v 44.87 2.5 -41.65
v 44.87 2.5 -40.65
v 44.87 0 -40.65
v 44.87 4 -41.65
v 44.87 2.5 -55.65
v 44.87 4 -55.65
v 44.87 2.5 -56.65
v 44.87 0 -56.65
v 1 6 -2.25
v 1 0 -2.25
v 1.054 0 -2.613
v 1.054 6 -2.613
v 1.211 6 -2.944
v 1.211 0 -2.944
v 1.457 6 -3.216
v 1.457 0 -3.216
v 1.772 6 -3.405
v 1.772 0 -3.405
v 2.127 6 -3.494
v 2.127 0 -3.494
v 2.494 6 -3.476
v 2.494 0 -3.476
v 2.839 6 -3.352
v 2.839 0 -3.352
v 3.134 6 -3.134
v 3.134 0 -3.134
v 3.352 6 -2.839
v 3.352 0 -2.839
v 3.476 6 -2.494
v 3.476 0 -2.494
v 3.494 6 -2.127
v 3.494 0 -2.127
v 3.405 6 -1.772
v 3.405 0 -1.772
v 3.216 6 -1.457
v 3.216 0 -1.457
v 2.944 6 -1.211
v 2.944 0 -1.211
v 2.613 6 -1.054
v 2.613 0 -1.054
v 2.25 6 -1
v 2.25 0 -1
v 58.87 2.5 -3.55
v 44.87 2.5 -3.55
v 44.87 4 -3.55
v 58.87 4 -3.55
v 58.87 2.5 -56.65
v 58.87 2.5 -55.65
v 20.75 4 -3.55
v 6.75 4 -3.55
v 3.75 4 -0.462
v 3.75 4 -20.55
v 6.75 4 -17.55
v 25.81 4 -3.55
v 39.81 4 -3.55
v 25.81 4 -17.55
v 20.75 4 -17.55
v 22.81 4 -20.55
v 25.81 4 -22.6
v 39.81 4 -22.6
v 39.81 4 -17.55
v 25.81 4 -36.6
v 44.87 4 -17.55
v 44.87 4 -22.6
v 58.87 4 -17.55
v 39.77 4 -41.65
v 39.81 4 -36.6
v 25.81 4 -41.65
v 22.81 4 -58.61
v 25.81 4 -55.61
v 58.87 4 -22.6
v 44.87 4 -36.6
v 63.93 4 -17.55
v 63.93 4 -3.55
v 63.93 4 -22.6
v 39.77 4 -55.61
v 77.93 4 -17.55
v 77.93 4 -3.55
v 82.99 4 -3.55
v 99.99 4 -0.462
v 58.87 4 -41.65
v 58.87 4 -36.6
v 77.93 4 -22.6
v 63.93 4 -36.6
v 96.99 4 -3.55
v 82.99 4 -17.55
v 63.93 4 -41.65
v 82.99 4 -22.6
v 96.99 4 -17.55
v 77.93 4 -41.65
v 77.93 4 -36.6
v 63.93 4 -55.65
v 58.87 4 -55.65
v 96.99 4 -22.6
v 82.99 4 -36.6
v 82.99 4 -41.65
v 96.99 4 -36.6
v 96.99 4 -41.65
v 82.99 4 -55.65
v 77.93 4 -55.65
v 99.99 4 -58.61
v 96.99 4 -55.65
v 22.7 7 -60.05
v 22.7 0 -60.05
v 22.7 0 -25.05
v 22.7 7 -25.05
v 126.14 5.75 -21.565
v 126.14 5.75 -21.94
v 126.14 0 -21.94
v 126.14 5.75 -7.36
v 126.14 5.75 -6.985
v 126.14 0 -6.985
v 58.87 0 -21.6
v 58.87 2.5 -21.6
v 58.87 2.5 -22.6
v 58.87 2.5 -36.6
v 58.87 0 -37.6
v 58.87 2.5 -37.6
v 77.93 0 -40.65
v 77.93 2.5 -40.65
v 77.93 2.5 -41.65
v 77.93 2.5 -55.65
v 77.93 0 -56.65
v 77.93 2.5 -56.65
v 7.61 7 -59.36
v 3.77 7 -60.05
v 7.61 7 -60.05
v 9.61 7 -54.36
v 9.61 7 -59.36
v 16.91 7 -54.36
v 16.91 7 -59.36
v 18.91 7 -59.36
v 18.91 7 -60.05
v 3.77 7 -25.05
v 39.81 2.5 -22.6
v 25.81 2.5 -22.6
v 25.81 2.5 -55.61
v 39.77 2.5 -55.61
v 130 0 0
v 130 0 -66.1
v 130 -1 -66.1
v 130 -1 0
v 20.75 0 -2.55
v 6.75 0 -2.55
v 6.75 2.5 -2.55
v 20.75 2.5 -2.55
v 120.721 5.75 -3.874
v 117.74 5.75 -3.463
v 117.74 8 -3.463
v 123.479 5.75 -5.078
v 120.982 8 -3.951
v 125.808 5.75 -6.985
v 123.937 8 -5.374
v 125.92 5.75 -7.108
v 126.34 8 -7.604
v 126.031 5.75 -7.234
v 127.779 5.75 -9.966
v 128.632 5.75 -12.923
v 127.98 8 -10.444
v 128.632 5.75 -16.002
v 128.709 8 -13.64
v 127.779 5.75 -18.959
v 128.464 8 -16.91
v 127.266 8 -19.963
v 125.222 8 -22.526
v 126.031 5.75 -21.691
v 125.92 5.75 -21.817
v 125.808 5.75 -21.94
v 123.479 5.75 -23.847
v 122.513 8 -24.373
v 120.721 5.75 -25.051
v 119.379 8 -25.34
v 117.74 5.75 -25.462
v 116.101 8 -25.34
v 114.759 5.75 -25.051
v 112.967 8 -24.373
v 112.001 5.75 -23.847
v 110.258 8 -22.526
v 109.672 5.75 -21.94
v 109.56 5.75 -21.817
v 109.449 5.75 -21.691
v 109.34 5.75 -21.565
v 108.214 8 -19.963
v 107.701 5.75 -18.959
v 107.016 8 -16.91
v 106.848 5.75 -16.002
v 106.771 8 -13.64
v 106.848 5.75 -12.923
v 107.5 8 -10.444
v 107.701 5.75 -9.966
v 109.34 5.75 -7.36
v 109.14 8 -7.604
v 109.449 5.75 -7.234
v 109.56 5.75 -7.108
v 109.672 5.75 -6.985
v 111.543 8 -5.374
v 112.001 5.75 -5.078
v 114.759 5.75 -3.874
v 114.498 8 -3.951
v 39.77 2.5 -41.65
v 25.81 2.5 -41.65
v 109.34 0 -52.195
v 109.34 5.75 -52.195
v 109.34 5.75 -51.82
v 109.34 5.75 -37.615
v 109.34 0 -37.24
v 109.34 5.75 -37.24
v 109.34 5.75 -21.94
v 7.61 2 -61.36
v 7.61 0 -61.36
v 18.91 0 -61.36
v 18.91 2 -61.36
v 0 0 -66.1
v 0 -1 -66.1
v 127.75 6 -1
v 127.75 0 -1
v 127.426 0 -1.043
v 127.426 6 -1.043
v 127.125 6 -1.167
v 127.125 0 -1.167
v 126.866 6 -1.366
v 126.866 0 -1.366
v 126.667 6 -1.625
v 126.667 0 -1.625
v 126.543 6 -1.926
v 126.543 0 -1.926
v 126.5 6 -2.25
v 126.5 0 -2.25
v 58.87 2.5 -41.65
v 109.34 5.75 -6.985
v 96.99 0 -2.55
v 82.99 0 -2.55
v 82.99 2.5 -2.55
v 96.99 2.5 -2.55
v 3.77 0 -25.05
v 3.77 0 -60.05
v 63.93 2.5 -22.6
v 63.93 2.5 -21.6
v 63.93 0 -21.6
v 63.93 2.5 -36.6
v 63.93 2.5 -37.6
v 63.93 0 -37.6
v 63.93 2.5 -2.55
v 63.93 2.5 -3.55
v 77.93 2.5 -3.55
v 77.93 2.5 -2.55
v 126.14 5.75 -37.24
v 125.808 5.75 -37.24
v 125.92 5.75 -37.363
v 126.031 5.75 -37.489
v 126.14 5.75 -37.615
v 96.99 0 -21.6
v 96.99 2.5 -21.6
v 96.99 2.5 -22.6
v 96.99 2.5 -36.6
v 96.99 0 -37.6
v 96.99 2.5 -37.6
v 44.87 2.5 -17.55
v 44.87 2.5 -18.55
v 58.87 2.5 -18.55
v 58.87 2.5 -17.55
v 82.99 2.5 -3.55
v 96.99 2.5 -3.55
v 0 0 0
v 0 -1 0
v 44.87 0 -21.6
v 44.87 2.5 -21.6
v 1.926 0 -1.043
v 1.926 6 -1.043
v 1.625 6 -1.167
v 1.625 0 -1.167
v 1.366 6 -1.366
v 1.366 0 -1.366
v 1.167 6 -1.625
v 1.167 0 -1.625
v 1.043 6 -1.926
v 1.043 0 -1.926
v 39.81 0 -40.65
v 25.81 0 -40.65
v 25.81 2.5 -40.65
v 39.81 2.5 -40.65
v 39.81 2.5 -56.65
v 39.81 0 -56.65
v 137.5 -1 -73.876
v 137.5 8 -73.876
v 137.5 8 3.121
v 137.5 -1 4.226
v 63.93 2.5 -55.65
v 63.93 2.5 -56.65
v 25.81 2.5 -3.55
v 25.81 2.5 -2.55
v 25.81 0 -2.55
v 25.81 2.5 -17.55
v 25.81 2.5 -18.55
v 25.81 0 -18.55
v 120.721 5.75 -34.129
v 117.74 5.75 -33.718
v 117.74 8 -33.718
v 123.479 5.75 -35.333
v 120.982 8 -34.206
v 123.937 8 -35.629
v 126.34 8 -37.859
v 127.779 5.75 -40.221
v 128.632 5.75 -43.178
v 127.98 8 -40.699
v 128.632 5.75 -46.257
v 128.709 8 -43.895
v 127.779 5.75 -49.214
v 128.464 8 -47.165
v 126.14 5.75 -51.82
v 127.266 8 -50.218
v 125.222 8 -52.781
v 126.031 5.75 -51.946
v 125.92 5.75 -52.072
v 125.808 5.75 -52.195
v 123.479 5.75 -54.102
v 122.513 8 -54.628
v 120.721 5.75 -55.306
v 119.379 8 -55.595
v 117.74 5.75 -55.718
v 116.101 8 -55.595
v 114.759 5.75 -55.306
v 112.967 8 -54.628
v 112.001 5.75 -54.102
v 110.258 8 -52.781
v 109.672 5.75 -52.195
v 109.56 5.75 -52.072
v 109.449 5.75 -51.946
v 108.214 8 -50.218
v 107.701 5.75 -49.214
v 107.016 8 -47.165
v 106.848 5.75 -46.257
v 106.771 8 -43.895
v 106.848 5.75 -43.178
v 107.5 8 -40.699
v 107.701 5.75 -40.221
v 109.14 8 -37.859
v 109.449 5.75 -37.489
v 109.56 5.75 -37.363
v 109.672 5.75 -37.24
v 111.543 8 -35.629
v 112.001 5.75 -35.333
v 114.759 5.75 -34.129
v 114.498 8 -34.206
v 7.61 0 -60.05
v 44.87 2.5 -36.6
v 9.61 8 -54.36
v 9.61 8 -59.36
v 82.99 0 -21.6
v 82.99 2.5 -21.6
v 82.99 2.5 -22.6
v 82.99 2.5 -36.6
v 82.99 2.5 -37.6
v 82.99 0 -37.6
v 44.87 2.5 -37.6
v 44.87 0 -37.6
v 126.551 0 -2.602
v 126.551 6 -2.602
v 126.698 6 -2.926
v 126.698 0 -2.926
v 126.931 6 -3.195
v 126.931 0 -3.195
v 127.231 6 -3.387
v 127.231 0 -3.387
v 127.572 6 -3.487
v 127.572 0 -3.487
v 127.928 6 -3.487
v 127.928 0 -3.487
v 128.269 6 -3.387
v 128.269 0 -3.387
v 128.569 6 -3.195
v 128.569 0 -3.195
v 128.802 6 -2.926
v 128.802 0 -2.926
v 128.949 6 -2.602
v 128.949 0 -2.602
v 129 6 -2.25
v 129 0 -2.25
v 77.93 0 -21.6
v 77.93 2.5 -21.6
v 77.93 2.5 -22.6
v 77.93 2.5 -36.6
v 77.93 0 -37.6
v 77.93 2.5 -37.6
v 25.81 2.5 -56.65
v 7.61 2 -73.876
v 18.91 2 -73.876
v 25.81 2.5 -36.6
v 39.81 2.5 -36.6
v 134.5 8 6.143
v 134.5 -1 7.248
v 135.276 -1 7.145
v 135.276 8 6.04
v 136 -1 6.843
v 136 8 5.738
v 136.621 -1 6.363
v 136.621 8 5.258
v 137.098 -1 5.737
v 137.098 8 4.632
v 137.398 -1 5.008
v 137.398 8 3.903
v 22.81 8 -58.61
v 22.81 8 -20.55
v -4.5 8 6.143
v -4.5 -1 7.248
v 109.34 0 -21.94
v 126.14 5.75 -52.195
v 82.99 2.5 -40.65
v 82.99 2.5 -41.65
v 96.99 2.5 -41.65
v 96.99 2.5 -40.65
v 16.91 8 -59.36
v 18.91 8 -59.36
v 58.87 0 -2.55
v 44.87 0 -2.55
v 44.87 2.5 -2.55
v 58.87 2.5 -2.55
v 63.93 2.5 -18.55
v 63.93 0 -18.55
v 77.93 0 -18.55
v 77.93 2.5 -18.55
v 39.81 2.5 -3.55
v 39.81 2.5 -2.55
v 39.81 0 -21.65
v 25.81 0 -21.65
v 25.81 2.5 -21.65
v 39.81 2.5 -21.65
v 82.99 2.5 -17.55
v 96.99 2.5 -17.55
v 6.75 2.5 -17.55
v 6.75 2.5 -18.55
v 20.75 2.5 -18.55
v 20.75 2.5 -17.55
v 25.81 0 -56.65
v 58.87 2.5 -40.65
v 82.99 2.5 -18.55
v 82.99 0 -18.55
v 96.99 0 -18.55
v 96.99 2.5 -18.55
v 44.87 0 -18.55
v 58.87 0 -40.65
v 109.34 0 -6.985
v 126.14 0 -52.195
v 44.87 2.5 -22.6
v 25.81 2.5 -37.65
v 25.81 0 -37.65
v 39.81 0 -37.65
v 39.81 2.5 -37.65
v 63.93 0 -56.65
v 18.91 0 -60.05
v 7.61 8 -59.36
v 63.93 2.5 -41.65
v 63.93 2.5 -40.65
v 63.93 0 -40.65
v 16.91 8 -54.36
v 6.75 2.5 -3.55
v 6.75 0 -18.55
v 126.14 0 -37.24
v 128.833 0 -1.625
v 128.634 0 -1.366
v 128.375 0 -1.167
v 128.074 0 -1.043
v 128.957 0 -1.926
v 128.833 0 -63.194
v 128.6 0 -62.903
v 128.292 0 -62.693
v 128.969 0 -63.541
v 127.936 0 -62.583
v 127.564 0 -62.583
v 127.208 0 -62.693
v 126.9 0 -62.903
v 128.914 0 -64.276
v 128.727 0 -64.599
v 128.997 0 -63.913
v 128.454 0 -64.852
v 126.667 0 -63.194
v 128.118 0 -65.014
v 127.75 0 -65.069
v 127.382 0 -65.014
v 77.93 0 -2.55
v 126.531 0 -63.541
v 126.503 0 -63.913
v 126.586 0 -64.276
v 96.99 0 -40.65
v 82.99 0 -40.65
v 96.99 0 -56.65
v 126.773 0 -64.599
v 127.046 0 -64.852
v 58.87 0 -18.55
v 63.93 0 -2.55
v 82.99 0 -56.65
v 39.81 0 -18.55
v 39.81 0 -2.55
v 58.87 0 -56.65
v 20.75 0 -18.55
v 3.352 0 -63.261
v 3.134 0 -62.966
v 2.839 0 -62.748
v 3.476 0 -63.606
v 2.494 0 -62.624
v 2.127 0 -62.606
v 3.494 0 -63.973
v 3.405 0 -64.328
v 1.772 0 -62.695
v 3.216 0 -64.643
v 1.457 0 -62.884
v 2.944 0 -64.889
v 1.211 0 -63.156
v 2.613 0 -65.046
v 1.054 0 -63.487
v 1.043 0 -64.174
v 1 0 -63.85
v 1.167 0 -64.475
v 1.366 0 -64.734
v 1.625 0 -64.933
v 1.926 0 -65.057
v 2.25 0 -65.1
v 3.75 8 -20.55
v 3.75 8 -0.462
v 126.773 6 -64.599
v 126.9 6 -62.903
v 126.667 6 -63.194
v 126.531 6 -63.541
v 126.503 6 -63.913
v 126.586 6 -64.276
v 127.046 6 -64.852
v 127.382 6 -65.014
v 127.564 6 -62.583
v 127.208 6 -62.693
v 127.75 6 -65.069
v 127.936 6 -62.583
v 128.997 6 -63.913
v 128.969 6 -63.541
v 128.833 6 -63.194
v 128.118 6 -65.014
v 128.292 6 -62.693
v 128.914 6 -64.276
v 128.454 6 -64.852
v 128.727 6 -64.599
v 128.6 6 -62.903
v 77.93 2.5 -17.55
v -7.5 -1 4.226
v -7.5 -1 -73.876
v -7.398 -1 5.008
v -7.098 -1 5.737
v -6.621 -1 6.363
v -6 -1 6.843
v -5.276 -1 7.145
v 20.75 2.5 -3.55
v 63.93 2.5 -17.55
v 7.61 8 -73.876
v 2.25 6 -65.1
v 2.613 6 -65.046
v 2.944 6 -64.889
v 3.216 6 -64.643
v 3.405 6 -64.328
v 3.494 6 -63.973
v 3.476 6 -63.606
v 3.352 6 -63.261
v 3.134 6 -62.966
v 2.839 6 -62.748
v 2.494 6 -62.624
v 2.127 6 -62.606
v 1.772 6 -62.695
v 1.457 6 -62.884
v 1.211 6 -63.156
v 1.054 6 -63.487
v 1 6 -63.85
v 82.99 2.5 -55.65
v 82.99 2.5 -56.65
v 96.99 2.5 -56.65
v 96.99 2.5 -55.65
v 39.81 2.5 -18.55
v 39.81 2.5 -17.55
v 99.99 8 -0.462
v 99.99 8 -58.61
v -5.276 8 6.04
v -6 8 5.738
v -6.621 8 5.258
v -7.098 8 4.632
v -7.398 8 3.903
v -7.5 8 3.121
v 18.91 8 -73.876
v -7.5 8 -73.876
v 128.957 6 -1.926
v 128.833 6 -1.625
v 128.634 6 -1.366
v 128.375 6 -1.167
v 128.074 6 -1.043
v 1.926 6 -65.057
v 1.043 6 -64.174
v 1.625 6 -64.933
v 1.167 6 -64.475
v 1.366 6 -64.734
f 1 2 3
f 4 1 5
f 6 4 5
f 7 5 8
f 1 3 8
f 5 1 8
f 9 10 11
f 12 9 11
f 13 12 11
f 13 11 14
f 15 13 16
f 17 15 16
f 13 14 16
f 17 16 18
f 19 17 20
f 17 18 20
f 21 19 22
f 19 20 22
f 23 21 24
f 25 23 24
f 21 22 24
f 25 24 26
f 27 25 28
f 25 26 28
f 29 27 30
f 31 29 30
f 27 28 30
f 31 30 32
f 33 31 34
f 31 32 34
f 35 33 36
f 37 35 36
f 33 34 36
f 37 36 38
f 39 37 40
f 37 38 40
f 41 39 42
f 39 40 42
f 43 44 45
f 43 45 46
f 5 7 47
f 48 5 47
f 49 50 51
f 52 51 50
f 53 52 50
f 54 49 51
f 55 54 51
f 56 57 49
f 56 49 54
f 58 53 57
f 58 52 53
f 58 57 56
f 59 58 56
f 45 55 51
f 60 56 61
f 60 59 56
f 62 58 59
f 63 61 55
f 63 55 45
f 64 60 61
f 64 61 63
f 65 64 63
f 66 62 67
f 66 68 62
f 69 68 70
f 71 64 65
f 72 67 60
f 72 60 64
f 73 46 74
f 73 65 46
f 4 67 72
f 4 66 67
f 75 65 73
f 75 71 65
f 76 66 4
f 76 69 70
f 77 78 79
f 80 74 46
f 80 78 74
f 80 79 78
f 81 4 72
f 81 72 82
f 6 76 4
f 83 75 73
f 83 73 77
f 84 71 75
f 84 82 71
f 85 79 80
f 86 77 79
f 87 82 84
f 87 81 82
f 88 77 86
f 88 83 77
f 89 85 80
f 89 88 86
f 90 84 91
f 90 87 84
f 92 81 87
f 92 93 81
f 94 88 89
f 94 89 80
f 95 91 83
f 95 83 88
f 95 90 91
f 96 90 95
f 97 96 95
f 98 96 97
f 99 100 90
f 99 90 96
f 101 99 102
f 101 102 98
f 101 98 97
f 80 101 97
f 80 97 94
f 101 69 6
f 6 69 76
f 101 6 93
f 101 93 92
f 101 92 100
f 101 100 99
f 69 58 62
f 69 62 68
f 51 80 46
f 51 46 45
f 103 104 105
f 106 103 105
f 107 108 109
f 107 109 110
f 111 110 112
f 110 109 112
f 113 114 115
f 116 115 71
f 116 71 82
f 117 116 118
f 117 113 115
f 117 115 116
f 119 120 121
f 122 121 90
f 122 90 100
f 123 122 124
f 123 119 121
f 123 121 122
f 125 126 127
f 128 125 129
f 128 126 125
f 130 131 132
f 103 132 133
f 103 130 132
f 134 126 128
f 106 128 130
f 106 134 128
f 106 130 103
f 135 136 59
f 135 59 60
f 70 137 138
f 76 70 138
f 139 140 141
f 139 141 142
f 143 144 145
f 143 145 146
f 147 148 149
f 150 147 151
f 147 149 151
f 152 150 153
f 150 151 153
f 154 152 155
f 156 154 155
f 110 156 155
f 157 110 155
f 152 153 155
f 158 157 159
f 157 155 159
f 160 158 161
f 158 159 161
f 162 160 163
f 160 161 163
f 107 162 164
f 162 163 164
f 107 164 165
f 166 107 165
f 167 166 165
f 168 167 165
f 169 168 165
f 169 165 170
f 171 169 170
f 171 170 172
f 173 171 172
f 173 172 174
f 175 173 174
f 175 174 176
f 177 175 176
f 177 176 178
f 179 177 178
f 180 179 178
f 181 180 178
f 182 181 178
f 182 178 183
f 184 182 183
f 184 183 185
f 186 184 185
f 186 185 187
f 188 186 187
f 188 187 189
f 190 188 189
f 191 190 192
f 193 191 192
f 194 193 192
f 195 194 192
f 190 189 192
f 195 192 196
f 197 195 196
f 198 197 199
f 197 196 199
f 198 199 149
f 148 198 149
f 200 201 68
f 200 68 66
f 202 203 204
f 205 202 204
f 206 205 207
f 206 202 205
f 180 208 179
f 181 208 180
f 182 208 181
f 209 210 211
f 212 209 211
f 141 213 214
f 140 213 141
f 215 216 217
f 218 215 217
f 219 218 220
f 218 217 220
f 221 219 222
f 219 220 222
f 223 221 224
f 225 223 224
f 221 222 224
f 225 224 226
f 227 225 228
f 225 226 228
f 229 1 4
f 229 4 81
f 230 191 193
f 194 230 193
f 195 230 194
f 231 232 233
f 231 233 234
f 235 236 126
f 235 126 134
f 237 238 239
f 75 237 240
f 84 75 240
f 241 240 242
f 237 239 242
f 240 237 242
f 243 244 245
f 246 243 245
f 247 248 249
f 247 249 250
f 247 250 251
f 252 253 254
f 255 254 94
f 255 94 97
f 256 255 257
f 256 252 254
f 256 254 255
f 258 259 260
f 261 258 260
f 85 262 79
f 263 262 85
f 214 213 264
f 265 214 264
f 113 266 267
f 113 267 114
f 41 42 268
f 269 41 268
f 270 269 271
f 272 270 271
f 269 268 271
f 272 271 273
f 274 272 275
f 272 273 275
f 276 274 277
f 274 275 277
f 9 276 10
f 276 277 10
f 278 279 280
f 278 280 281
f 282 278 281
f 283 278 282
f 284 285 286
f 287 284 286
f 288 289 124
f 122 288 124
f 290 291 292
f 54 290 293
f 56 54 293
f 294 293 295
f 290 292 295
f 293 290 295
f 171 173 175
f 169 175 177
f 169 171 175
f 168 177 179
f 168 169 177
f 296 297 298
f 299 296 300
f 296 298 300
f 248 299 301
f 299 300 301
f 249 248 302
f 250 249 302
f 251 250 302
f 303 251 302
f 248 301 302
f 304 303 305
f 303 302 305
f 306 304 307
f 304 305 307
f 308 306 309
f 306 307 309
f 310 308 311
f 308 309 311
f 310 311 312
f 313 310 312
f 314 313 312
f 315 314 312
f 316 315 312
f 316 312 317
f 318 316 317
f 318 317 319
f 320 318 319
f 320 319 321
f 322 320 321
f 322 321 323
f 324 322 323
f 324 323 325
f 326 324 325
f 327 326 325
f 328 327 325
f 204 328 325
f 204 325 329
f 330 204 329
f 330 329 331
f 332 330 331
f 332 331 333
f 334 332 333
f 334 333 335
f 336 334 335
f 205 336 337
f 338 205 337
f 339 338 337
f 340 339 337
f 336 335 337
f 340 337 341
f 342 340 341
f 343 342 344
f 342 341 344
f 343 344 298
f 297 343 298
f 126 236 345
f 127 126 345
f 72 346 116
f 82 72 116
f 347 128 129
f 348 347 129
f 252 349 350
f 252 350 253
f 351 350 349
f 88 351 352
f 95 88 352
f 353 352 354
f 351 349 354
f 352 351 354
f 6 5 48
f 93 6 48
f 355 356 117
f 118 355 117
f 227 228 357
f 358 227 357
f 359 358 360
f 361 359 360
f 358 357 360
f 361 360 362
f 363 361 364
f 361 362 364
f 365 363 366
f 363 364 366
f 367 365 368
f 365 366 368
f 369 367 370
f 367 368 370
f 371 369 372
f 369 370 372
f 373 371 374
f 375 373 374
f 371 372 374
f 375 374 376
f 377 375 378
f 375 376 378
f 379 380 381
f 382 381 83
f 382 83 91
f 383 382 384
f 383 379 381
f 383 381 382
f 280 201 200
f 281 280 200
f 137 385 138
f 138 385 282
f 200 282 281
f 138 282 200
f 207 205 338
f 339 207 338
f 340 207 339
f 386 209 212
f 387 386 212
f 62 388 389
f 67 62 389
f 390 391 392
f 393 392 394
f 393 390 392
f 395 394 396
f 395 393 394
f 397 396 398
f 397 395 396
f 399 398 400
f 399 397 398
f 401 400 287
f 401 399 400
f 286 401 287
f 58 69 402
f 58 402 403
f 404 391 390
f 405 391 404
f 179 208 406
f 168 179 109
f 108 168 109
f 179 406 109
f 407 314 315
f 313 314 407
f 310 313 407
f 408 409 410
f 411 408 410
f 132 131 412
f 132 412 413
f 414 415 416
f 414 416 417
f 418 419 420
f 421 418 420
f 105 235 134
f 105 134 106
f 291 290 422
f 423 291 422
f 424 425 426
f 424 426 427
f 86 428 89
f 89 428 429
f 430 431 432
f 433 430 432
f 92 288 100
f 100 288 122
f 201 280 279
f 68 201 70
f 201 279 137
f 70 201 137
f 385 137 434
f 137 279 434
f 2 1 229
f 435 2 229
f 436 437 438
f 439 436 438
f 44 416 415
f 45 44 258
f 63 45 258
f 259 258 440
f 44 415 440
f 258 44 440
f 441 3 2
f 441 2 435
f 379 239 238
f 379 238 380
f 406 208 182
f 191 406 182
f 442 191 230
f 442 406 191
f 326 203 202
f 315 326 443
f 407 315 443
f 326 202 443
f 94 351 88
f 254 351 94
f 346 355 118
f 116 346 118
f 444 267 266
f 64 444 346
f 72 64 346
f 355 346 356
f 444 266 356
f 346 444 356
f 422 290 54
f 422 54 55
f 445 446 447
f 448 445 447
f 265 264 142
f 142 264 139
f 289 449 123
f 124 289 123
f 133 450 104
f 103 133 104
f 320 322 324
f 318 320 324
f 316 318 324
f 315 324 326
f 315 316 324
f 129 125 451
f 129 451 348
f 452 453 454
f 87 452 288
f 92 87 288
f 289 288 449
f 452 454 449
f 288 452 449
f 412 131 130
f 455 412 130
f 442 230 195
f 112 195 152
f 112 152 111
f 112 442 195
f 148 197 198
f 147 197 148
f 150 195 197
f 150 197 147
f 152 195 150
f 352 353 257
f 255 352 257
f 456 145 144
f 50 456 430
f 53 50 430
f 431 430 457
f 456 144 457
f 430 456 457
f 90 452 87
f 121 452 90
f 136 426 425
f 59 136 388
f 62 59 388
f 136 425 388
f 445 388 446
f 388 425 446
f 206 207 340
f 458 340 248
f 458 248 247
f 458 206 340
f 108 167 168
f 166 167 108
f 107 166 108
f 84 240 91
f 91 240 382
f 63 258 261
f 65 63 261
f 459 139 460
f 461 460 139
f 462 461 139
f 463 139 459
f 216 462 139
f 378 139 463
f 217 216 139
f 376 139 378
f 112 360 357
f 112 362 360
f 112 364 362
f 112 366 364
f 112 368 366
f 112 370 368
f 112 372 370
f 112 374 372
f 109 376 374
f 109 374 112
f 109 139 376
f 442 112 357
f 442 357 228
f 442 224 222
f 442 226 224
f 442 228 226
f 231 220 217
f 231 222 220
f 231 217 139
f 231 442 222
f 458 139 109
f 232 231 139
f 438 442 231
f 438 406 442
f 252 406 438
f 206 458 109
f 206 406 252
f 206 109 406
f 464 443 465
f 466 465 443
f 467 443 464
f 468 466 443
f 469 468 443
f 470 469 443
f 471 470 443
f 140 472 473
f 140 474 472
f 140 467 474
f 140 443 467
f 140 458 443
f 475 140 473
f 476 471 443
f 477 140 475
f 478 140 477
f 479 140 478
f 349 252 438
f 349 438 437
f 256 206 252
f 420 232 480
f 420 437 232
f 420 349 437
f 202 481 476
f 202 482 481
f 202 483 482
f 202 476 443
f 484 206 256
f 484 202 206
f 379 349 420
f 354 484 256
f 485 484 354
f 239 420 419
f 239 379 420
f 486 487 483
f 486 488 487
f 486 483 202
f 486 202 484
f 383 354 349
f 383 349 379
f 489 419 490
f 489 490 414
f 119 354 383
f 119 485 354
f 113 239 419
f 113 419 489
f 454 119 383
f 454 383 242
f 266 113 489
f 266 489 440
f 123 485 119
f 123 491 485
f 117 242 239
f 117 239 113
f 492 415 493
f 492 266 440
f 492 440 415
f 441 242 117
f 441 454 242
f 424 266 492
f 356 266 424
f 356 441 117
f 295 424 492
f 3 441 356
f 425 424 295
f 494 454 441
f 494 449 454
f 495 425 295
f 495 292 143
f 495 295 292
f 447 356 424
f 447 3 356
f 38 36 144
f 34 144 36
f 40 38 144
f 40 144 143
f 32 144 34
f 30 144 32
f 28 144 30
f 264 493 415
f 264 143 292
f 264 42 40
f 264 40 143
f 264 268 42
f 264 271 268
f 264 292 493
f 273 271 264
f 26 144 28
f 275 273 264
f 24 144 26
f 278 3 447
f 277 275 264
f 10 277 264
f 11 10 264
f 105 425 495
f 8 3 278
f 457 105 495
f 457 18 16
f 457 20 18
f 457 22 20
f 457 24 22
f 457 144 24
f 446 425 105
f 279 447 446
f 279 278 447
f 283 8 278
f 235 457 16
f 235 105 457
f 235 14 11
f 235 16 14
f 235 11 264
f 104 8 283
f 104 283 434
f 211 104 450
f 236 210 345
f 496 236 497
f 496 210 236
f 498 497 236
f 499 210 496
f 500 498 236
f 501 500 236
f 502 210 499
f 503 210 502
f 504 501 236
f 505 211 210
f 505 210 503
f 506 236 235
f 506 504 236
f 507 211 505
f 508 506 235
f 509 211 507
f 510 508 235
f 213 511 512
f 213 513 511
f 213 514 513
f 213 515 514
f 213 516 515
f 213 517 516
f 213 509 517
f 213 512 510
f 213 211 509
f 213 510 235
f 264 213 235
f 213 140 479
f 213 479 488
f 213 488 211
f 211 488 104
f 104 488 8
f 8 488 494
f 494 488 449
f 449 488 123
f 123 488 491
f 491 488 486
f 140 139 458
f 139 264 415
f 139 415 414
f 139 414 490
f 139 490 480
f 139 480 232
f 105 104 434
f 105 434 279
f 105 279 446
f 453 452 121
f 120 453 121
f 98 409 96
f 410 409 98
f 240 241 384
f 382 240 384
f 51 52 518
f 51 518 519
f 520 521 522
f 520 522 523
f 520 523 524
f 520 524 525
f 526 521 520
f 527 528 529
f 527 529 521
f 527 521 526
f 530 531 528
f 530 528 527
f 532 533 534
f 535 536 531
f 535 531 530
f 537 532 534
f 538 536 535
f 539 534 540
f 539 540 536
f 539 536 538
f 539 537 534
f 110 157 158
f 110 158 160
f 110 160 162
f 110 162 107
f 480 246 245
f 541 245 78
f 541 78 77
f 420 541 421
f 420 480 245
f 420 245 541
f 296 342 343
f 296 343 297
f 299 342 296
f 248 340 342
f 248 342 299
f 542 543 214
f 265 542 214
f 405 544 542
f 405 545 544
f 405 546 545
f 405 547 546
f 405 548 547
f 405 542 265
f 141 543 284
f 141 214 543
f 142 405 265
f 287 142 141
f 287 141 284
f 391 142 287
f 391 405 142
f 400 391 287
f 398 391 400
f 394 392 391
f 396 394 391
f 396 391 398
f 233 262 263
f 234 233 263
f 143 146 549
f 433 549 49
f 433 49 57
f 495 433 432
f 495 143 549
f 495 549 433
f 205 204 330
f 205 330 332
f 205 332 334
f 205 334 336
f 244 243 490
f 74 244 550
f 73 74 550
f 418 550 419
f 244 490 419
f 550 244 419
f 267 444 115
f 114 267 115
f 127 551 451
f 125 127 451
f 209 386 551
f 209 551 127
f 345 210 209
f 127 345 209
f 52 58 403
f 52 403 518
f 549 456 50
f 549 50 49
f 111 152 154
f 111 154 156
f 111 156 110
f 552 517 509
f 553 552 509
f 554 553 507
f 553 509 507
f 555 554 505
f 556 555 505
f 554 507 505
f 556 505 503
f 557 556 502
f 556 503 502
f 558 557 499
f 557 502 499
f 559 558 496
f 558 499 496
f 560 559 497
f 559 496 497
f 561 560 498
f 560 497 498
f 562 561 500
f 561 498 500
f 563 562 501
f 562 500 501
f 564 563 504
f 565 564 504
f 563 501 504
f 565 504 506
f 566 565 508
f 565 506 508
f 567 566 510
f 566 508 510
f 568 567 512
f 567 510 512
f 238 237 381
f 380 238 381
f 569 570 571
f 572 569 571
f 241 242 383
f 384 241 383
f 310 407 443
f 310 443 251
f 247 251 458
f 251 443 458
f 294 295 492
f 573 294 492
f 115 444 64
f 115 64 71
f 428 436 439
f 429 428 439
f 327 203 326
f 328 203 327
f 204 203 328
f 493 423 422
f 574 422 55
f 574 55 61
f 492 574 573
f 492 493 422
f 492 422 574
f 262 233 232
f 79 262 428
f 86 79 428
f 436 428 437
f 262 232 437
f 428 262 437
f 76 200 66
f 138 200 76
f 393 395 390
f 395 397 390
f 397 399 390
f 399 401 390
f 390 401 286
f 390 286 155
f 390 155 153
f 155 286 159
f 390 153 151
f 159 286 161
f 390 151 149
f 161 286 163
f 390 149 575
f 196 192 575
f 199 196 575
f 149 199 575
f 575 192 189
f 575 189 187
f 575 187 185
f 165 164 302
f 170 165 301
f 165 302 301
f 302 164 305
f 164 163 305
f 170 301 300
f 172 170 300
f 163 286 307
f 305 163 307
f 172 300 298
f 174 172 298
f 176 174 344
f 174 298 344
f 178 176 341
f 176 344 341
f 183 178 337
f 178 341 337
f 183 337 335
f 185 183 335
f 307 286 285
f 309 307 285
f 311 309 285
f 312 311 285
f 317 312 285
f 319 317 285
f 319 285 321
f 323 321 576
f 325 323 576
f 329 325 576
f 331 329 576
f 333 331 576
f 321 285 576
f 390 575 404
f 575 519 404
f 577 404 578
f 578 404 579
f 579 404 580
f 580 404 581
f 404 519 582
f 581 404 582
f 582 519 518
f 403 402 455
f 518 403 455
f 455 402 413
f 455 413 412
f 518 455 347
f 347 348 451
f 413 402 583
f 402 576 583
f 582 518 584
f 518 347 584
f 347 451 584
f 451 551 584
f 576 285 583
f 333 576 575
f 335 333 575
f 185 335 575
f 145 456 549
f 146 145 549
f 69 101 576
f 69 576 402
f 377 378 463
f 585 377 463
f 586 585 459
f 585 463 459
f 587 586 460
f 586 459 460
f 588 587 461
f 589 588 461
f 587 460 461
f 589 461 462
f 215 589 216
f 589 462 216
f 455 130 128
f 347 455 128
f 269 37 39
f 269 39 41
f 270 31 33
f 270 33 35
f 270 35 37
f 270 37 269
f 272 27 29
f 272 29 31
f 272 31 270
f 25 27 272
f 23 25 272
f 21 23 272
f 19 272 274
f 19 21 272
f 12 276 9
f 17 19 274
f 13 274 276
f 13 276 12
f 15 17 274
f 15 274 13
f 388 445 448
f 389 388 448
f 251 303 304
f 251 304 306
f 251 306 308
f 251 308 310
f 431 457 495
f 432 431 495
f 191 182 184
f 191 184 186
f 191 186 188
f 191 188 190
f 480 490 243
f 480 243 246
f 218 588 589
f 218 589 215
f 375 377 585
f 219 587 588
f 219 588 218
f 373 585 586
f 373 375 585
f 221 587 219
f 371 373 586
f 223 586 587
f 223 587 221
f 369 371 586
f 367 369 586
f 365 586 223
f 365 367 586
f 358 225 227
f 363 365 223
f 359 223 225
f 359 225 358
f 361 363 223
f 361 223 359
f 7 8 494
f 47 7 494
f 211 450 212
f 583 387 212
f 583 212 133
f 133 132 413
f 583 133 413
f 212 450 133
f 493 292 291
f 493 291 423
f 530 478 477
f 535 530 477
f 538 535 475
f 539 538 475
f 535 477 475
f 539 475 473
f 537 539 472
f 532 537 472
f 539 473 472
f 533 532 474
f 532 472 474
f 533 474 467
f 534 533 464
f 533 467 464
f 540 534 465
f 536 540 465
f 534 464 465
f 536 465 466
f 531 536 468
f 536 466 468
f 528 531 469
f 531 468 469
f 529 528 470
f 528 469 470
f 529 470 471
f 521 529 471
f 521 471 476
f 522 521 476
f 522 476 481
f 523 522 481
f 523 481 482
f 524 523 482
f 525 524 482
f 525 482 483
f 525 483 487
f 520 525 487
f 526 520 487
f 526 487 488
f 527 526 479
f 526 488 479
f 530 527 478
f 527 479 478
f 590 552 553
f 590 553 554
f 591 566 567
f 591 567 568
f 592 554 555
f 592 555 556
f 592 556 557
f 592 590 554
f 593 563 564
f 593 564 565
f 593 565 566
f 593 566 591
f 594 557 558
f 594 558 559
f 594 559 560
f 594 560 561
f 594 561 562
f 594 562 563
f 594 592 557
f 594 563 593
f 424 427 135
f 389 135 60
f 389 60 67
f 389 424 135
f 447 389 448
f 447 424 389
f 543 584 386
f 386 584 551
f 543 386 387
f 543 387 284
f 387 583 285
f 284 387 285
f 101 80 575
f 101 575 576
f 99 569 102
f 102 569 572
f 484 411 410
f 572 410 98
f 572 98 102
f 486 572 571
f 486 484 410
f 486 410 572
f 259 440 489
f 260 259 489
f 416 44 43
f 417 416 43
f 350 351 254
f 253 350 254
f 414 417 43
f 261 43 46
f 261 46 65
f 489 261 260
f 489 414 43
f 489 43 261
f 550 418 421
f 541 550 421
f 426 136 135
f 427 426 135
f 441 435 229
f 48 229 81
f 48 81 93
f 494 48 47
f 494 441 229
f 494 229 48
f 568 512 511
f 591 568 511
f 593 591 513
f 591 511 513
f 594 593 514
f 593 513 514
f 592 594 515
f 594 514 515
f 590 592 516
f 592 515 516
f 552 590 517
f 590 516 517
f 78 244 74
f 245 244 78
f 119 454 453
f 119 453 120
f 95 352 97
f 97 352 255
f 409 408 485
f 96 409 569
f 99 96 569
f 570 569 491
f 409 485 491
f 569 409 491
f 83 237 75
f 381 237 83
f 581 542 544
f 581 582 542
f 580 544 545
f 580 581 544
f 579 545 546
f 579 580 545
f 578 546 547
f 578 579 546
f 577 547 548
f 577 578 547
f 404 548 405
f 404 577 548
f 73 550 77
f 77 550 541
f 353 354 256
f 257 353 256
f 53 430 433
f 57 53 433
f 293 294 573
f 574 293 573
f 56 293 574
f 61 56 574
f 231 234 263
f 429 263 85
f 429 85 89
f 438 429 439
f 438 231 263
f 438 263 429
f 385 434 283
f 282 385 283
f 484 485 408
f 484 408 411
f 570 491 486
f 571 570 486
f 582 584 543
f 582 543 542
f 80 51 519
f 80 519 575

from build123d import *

# Parameters (mm, degrees)
SKETCH1_W           = 14
SKETCH1_H           = 14
SKETCH1_W_2         = 13.96
SKETCH1_H_2         = 13.96
SKETCH1_W_3         = 17.83
SKETCH1_H_3         = 34.365
SKETCH1_W_4         = 16.8
SKETCH1_H_4         = 14.955
BOSS_EXTRUDE2_DEPTH = 4
SKETCH3_W           = 14
SKETCH3_H           = 16
CUT_EXTRUDE1_DEPTH  = 2.5
SKETCH6_W           = 145
SKETCH6_H           = 81.124541
BOSS_EXTRUDE3_DEPTH = 8
SKETCH12_R          = 1.25
CUT_EXTRUDE5_DEPTH  = 6
SKETCH13_W          = 18.93
SKETCH13_H          = 35
CUT_EXTRUDE6_DEPTH  = 7
SKETCH14_W          = 16.8
SKETCH14_H          = 14.955
CUT_EXTRUDE8_DEPTH  = 5.75
SKETCH15_R          = 4
CUT_EXTRUDE9_DEPTH  = 10
SKETCH16_R          = 11
CUT_EXTRUDE10_DEPTH = 2.25
SKETCH20_W          = 145
SKETCH20_H          = 81.124541
SKETCH20_W_2        = 130
SKETCH20_H_2        = 66.1
BOSS_EXTRUDE5_DEPTH = 1
SKETCH21_W          = 145
SKETCH21_H          = 34.866824831
CUT_EXTRUDE11_DEPTH = 18
FILLET1_R           = 3
SKETCH28_W          = 11.3
SKETCH28_H          = 2
CUT_EXTRUDE14_DEPTH = 10
SKETCH31_W          = 11.3
SKETCH31_H          = 6
CUT_EXTRUDE15_DEPTH = 16


with BuildPart() as part:
    # Sketch1 → Boss-Extrude2 (new body)
    with BuildSketch(Plane(origin=(0, 0, 0), x_dir=(1, 0, 0), z_dir=(0, 1, 0))):
        Polygon((0, 0), (109.34, 0), (130, 0), (130, 66.1), (0, 66.1), align=None)
        with Locations((51.87, 10.55)):
            Rectangle(SKETCH1_W, SKETCH1_H, mode=Mode.SUBTRACT)
        with Locations((32.81, 10.55)):
            Rectangle(SKETCH1_W, SKETCH1_H, mode=Mode.SUBTRACT)
        with Locations((32.81, 29.6)):
            Rectangle(SKETCH1_W, SKETCH1_H, mode=Mode.SUBTRACT)
        with Locations((32.79, 48.63)):
            Rectangle(SKETCH1_W_2, SKETCH1_H_2, mode=Mode.SUBTRACT)
        with Locations((13.145, 42.2325)):
            Rectangle(SKETCH1_W_3, SKETCH1_H_3, mode=Mode.SUBTRACT)
        with Locations((13.75, 10.55)):
            Rectangle(SKETCH1_W, SKETCH1_H, mode=Mode.SUBTRACT)
        with Locations((51.87, 29.6)):
            Rectangle(SKETCH1_W, SKETCH1_H, mode=Mode.SUBTRACT)
        with Locations((70.93, 10.55)):
            Rectangle(SKETCH1_W, SKETCH1_H, mode=Mode.SUBTRACT)
        with Locations((89.99, 10.55)):
            Rectangle(SKETCH1_W, SKETCH1_H, mode=Mode.SUBTRACT)
        with Locations((117.74, 14.4625)):
            Rectangle(SKETCH1_W_4, SKETCH1_H_4, mode=Mode.SUBTRACT)
        with Locations((70.93, 29.6)):
            Rectangle(SKETCH1_W, SKETCH1_H, mode=Mode.SUBTRACT)
        with Locations((89.99, 29.6)):
            Rectangle(SKETCH1_W, SKETCH1_H, mode=Mode.SUBTRACT)
        with Locations((51.87, 48.65)):
            Rectangle(SKETCH1_W, SKETCH1_H, mode=Mode.SUBTRACT)
        with Locations((70.93, 48.65)):
            Rectangle(SKETCH1_W, SKETCH1_H, mode=Mode.SUBTRACT)
        with Locations((89.99, 48.65)):
            Rectangle(SKETCH1_W, SKETCH1_H, mode=Mode.SUBTRACT)
        with Locations((117.74, 44.7175)):
            Rectangle(SKETCH1_W_4, SKETCH1_H_4, mode=Mode.SUBTRACT)
    extrude(amount=BOSS_EXTRUDE2_DEPTH)

    # Sketch3 → Cut-Extrude1 (cut)
    with BuildSketch(Plane(origin=(0, 0, 0), x_dir=(1, 0, 0), z_dir=(0, 1, 0))):
        with Locations((89.99, 29.6)):
            Rectangle(SKETCH3_W, SKETCH3_H)
        with Locations((70.93, 29.6)):
            Rectangle(SKETCH3_W, SKETCH3_H)
        with Locations((89.99, 48.65)):
            Rectangle(SKETCH3_W, SKETCH3_H)
        with Locations((70.93, 48.65)):
            Rectangle(SKETCH3_W, SKETCH3_H)
        with Locations((51.87, 48.65)):
            Rectangle(SKETCH3_W, SKETCH3_H)
        with Locations((32.81, 48.65)):
            Rectangle(SKETCH3_W, SKETCH3_H)
        with Locations((32.81, 29.650197757)):
            Rectangle(SKETCH3_W, SKETCH3_H)
        with Locations((51.87, 29.6)):
            Rectangle(SKETCH3_W, SKETCH3_H)
        with Locations((13.75, 10.55)):
            Rectangle(SKETCH3_W, SKETCH3_H)
        with Locations((32.81, 10.55)):
            Rectangle(SKETCH3_W, SKETCH3_H)
        with Locations((51.87, 10.55)):
            Rectangle(SKETCH3_W, SKETCH3_H)
        with Locations((70.93, 10.55)):
            Rectangle(SKETCH3_W, SKETCH3_H)
        with Locations((89.99, 10.55)):
            Rectangle(SKETCH3_W, SKETCH3_H)
    extrude(amount=CUT_EXTRUDE1_DEPTH, mode=Mode.SUBTRACT)

    # Sketch6 → Boss-Extrude3 (add)
    with BuildSketch(Plane(origin=(0, 0, 0), x_dir=(-1, 0, 0), z_dir=(0, -1, 0))):
        with Locations((-65, 33.3140765)):
            Rectangle(SKETCH6_W, SKETCH6_H)
        Polygon((-99.99, 58.61), (-39.77, 58.61), (-22.81, 58.61), (-22.81, 53.222321133), (-22.81, 20.55), (-3.75, 20.55), (-3.75, 12.496372948), (-3.75, 0.461789698), (-20.75, 0.461789698), (-99.99, 0.461789698), align=None, mode=Mode.SUBTRACT)
    extrude(amount=-BOSS_EXTRUDE3_DEPTH)

    # Sketch12 → Cut-Extrude5 (cut)
    with BuildSketch(Plane(origin=(0, 0, 0), x_dir=(-1, 0, 0), z_dir=(0, -1, 0))):
        with BuildLine():
            ThreePointArc((-1, 63.85), (-1.366116524, 64.733883476), (-2.25, 65.1))
            Line((-2.25, 65.1), (-2.25, 63.85))
            Line((-2.25, 63.85), (-1, 63.85))
        make_face()
        with BuildLine():
            Line((-2.25, 63.85), (-2.25, 65.1))
            ThreePointArc((-2.25, 65.1), (-3.133883476, 62.966116524), (-1, 63.85))
            Line((-1, 63.85), (-2.25, 63.85))
        make_face()
        with BuildLine():
            ThreePointArc((-1, 2.25), (-3.133883476, 3.133883476), (-2.25, 1))
            Line((-2.25, 1), (-2.25, 2.25))
            Line((-2.25, 2.25), (-1, 2.25))
        make_face()
        with BuildLine():
            Line((-2.25, 2.25), (-2.25, 1))
            ThreePointArc((-2.25, 1), (-1.366116524, 1.366116524), (-1, 2.25))
            Line((-1, 2.25), (-2.25, 2.25))
        make_face()
        with BuildLine():
            ThreePointArc((-129, 2.25), (-128.633883476, 1.366116524), (-127.75, 1))
            Line((-127.75, 1), (-127.75, 2.25))
            Line((-127.75, 2.25), (-129, 2.25))
        make_face()
        with BuildLine():
            Line((-127.75, 2.25), (-127.75, 1))
            ThreePointArc((-127.75, 1), (-126.866116524, 1.366116524), (-126.5, 2.25))
            ThreePointArc((-126.5, 2.25), (-127.75, 3.5), (-129, 2.25))
            Line((-129, 2.25), (-127.75, 2.25))
        make_face()
        with Locations(Location((-127.75, 63.819224339, 0), (0, 0, 90))):
            Circle(SKETCH12_R)
    extrude(amount=-CUT_EXTRUDE5_DEPTH, mode=Mode.SUBTRACT)

    # Sketch13 → Cut-Extrude6 (cut)
    with BuildSketch(Plane.XZ):
        with Locations((13.235, -42.55)):
            Rectangle(SKETCH13_W, SKETCH13_H)
    extrude(amount=-CUT_EXTRUDE6_DEPTH, mode=Mode.SUBTRACT)

    # Sketch14 → Cut-Extrude8 (cut)
    with BuildSketch(Plane.XZ):
        with Locations((117.74, -14.4625)):
            Rectangle(SKETCH14_W, SKETCH14_H)
        with Locations((117.74, -44.7175)):
            Rectangle(SKETCH14_W, SKETCH14_H)
    extrude(amount=-CUT_EXTRUDE8_DEPTH, mode=Mode.SUBTRACT)

    # Sketch15 → Cut-Extrude9 (cut)
    with BuildSketch(Plane.XZ):
        with Locations(Location((117.74, -44.7175, 0), (0, 0, 270))):
            Circle(SKETCH15_R)
        with Locations(Location((117.74, -14.4625, 0), (0, 0, 270))):
            Circle(SKETCH15_R)
    extrude(amount=-CUT_EXTRUDE9_DEPTH, mode=Mode.SUBTRACT)

    # Sketch16 → Cut-Extrude10 (cut)
    with BuildSketch(Plane(origin=(0, 8, 0), x_dir=(1, 0, 0), z_dir=(0, 1, 0))):
        with Locations(Location((117.74, 44.7175, 0), (0, 0, 270))):
            Circle(SKETCH16_R)
        with Locations(Location((117.74, 14.4625, 0), (0, 0, 270))):
            Circle(SKETCH16_R)
    extrude(amount=-CUT_EXTRUDE10_DEPTH, mode=Mode.SUBTRACT)

    # Sketch20 → Boss-Extrude5 (add)
    with BuildSketch(Plane.XZ):
        with Locations((65, -33.3140765)):
            Rectangle(SKETCH20_W, SKETCH20_H)
        with Locations((65, -33.05)):
            Rectangle(SKETCH20_W_2, SKETCH20_H_2, mode=Mode.SUBTRACT)
    extrude(amount=BOSS_EXTRUDE5_DEPTH)

    # Sketch21 → Cut-Extrude11 (cut)
    with BuildSketch(Plane(origin=(0, -1.861896279, 0.228612117), x_dir=(-1, 0, 0), z_dir=(0, 0.9925461516413211, -0.1218693434051548))):
        with Locations((-65, 24.505710134)):
            Rectangle(SKETCH21_W, SKETCH21_H)
    extrude(amount=CUT_EXTRUDE11_DEPTH, mode=Mode.SUBTRACT)

    # Fillet1
    fillet1_edges = [part.edges().sort_by_distance(p)[0] for p in [
        (-7.5, 3.5, 6.695663476),
        (137.5, 3.5, 6.695663476),
    ]]
    fillet(fillet1_edges, radius=FILLET1_R)

    # Sketch28 → Cut-Extrude14 (cut)
    with BuildSketch(Plane.XZ):
        Polygon((16.91, -59.36), (16.91, -55.61), (16.91, -54.36), (9.61, -54.36), (9.61, -59.36), align=None)
        with Locations((13.26, -60.36)):
            Rectangle(SKETCH28_W, SKETCH28_H)
    extrude(amount=-CUT_EXTRUDE14_DEPTH, mode=Mode.SUBTRACT)

    # Sketch31 → Cut-Extrude15 (cut)
    with BuildSketch(Plane.XY.offset(-61.36)):
        with Locations((13.26, 5)):
            Rectangle(SKETCH31_W, SKETCH31_H)
    extrude(amount=-CUT_EXTRUDE15_DEPTH, mode=Mode.SUBTRACT)


solid = part.part
